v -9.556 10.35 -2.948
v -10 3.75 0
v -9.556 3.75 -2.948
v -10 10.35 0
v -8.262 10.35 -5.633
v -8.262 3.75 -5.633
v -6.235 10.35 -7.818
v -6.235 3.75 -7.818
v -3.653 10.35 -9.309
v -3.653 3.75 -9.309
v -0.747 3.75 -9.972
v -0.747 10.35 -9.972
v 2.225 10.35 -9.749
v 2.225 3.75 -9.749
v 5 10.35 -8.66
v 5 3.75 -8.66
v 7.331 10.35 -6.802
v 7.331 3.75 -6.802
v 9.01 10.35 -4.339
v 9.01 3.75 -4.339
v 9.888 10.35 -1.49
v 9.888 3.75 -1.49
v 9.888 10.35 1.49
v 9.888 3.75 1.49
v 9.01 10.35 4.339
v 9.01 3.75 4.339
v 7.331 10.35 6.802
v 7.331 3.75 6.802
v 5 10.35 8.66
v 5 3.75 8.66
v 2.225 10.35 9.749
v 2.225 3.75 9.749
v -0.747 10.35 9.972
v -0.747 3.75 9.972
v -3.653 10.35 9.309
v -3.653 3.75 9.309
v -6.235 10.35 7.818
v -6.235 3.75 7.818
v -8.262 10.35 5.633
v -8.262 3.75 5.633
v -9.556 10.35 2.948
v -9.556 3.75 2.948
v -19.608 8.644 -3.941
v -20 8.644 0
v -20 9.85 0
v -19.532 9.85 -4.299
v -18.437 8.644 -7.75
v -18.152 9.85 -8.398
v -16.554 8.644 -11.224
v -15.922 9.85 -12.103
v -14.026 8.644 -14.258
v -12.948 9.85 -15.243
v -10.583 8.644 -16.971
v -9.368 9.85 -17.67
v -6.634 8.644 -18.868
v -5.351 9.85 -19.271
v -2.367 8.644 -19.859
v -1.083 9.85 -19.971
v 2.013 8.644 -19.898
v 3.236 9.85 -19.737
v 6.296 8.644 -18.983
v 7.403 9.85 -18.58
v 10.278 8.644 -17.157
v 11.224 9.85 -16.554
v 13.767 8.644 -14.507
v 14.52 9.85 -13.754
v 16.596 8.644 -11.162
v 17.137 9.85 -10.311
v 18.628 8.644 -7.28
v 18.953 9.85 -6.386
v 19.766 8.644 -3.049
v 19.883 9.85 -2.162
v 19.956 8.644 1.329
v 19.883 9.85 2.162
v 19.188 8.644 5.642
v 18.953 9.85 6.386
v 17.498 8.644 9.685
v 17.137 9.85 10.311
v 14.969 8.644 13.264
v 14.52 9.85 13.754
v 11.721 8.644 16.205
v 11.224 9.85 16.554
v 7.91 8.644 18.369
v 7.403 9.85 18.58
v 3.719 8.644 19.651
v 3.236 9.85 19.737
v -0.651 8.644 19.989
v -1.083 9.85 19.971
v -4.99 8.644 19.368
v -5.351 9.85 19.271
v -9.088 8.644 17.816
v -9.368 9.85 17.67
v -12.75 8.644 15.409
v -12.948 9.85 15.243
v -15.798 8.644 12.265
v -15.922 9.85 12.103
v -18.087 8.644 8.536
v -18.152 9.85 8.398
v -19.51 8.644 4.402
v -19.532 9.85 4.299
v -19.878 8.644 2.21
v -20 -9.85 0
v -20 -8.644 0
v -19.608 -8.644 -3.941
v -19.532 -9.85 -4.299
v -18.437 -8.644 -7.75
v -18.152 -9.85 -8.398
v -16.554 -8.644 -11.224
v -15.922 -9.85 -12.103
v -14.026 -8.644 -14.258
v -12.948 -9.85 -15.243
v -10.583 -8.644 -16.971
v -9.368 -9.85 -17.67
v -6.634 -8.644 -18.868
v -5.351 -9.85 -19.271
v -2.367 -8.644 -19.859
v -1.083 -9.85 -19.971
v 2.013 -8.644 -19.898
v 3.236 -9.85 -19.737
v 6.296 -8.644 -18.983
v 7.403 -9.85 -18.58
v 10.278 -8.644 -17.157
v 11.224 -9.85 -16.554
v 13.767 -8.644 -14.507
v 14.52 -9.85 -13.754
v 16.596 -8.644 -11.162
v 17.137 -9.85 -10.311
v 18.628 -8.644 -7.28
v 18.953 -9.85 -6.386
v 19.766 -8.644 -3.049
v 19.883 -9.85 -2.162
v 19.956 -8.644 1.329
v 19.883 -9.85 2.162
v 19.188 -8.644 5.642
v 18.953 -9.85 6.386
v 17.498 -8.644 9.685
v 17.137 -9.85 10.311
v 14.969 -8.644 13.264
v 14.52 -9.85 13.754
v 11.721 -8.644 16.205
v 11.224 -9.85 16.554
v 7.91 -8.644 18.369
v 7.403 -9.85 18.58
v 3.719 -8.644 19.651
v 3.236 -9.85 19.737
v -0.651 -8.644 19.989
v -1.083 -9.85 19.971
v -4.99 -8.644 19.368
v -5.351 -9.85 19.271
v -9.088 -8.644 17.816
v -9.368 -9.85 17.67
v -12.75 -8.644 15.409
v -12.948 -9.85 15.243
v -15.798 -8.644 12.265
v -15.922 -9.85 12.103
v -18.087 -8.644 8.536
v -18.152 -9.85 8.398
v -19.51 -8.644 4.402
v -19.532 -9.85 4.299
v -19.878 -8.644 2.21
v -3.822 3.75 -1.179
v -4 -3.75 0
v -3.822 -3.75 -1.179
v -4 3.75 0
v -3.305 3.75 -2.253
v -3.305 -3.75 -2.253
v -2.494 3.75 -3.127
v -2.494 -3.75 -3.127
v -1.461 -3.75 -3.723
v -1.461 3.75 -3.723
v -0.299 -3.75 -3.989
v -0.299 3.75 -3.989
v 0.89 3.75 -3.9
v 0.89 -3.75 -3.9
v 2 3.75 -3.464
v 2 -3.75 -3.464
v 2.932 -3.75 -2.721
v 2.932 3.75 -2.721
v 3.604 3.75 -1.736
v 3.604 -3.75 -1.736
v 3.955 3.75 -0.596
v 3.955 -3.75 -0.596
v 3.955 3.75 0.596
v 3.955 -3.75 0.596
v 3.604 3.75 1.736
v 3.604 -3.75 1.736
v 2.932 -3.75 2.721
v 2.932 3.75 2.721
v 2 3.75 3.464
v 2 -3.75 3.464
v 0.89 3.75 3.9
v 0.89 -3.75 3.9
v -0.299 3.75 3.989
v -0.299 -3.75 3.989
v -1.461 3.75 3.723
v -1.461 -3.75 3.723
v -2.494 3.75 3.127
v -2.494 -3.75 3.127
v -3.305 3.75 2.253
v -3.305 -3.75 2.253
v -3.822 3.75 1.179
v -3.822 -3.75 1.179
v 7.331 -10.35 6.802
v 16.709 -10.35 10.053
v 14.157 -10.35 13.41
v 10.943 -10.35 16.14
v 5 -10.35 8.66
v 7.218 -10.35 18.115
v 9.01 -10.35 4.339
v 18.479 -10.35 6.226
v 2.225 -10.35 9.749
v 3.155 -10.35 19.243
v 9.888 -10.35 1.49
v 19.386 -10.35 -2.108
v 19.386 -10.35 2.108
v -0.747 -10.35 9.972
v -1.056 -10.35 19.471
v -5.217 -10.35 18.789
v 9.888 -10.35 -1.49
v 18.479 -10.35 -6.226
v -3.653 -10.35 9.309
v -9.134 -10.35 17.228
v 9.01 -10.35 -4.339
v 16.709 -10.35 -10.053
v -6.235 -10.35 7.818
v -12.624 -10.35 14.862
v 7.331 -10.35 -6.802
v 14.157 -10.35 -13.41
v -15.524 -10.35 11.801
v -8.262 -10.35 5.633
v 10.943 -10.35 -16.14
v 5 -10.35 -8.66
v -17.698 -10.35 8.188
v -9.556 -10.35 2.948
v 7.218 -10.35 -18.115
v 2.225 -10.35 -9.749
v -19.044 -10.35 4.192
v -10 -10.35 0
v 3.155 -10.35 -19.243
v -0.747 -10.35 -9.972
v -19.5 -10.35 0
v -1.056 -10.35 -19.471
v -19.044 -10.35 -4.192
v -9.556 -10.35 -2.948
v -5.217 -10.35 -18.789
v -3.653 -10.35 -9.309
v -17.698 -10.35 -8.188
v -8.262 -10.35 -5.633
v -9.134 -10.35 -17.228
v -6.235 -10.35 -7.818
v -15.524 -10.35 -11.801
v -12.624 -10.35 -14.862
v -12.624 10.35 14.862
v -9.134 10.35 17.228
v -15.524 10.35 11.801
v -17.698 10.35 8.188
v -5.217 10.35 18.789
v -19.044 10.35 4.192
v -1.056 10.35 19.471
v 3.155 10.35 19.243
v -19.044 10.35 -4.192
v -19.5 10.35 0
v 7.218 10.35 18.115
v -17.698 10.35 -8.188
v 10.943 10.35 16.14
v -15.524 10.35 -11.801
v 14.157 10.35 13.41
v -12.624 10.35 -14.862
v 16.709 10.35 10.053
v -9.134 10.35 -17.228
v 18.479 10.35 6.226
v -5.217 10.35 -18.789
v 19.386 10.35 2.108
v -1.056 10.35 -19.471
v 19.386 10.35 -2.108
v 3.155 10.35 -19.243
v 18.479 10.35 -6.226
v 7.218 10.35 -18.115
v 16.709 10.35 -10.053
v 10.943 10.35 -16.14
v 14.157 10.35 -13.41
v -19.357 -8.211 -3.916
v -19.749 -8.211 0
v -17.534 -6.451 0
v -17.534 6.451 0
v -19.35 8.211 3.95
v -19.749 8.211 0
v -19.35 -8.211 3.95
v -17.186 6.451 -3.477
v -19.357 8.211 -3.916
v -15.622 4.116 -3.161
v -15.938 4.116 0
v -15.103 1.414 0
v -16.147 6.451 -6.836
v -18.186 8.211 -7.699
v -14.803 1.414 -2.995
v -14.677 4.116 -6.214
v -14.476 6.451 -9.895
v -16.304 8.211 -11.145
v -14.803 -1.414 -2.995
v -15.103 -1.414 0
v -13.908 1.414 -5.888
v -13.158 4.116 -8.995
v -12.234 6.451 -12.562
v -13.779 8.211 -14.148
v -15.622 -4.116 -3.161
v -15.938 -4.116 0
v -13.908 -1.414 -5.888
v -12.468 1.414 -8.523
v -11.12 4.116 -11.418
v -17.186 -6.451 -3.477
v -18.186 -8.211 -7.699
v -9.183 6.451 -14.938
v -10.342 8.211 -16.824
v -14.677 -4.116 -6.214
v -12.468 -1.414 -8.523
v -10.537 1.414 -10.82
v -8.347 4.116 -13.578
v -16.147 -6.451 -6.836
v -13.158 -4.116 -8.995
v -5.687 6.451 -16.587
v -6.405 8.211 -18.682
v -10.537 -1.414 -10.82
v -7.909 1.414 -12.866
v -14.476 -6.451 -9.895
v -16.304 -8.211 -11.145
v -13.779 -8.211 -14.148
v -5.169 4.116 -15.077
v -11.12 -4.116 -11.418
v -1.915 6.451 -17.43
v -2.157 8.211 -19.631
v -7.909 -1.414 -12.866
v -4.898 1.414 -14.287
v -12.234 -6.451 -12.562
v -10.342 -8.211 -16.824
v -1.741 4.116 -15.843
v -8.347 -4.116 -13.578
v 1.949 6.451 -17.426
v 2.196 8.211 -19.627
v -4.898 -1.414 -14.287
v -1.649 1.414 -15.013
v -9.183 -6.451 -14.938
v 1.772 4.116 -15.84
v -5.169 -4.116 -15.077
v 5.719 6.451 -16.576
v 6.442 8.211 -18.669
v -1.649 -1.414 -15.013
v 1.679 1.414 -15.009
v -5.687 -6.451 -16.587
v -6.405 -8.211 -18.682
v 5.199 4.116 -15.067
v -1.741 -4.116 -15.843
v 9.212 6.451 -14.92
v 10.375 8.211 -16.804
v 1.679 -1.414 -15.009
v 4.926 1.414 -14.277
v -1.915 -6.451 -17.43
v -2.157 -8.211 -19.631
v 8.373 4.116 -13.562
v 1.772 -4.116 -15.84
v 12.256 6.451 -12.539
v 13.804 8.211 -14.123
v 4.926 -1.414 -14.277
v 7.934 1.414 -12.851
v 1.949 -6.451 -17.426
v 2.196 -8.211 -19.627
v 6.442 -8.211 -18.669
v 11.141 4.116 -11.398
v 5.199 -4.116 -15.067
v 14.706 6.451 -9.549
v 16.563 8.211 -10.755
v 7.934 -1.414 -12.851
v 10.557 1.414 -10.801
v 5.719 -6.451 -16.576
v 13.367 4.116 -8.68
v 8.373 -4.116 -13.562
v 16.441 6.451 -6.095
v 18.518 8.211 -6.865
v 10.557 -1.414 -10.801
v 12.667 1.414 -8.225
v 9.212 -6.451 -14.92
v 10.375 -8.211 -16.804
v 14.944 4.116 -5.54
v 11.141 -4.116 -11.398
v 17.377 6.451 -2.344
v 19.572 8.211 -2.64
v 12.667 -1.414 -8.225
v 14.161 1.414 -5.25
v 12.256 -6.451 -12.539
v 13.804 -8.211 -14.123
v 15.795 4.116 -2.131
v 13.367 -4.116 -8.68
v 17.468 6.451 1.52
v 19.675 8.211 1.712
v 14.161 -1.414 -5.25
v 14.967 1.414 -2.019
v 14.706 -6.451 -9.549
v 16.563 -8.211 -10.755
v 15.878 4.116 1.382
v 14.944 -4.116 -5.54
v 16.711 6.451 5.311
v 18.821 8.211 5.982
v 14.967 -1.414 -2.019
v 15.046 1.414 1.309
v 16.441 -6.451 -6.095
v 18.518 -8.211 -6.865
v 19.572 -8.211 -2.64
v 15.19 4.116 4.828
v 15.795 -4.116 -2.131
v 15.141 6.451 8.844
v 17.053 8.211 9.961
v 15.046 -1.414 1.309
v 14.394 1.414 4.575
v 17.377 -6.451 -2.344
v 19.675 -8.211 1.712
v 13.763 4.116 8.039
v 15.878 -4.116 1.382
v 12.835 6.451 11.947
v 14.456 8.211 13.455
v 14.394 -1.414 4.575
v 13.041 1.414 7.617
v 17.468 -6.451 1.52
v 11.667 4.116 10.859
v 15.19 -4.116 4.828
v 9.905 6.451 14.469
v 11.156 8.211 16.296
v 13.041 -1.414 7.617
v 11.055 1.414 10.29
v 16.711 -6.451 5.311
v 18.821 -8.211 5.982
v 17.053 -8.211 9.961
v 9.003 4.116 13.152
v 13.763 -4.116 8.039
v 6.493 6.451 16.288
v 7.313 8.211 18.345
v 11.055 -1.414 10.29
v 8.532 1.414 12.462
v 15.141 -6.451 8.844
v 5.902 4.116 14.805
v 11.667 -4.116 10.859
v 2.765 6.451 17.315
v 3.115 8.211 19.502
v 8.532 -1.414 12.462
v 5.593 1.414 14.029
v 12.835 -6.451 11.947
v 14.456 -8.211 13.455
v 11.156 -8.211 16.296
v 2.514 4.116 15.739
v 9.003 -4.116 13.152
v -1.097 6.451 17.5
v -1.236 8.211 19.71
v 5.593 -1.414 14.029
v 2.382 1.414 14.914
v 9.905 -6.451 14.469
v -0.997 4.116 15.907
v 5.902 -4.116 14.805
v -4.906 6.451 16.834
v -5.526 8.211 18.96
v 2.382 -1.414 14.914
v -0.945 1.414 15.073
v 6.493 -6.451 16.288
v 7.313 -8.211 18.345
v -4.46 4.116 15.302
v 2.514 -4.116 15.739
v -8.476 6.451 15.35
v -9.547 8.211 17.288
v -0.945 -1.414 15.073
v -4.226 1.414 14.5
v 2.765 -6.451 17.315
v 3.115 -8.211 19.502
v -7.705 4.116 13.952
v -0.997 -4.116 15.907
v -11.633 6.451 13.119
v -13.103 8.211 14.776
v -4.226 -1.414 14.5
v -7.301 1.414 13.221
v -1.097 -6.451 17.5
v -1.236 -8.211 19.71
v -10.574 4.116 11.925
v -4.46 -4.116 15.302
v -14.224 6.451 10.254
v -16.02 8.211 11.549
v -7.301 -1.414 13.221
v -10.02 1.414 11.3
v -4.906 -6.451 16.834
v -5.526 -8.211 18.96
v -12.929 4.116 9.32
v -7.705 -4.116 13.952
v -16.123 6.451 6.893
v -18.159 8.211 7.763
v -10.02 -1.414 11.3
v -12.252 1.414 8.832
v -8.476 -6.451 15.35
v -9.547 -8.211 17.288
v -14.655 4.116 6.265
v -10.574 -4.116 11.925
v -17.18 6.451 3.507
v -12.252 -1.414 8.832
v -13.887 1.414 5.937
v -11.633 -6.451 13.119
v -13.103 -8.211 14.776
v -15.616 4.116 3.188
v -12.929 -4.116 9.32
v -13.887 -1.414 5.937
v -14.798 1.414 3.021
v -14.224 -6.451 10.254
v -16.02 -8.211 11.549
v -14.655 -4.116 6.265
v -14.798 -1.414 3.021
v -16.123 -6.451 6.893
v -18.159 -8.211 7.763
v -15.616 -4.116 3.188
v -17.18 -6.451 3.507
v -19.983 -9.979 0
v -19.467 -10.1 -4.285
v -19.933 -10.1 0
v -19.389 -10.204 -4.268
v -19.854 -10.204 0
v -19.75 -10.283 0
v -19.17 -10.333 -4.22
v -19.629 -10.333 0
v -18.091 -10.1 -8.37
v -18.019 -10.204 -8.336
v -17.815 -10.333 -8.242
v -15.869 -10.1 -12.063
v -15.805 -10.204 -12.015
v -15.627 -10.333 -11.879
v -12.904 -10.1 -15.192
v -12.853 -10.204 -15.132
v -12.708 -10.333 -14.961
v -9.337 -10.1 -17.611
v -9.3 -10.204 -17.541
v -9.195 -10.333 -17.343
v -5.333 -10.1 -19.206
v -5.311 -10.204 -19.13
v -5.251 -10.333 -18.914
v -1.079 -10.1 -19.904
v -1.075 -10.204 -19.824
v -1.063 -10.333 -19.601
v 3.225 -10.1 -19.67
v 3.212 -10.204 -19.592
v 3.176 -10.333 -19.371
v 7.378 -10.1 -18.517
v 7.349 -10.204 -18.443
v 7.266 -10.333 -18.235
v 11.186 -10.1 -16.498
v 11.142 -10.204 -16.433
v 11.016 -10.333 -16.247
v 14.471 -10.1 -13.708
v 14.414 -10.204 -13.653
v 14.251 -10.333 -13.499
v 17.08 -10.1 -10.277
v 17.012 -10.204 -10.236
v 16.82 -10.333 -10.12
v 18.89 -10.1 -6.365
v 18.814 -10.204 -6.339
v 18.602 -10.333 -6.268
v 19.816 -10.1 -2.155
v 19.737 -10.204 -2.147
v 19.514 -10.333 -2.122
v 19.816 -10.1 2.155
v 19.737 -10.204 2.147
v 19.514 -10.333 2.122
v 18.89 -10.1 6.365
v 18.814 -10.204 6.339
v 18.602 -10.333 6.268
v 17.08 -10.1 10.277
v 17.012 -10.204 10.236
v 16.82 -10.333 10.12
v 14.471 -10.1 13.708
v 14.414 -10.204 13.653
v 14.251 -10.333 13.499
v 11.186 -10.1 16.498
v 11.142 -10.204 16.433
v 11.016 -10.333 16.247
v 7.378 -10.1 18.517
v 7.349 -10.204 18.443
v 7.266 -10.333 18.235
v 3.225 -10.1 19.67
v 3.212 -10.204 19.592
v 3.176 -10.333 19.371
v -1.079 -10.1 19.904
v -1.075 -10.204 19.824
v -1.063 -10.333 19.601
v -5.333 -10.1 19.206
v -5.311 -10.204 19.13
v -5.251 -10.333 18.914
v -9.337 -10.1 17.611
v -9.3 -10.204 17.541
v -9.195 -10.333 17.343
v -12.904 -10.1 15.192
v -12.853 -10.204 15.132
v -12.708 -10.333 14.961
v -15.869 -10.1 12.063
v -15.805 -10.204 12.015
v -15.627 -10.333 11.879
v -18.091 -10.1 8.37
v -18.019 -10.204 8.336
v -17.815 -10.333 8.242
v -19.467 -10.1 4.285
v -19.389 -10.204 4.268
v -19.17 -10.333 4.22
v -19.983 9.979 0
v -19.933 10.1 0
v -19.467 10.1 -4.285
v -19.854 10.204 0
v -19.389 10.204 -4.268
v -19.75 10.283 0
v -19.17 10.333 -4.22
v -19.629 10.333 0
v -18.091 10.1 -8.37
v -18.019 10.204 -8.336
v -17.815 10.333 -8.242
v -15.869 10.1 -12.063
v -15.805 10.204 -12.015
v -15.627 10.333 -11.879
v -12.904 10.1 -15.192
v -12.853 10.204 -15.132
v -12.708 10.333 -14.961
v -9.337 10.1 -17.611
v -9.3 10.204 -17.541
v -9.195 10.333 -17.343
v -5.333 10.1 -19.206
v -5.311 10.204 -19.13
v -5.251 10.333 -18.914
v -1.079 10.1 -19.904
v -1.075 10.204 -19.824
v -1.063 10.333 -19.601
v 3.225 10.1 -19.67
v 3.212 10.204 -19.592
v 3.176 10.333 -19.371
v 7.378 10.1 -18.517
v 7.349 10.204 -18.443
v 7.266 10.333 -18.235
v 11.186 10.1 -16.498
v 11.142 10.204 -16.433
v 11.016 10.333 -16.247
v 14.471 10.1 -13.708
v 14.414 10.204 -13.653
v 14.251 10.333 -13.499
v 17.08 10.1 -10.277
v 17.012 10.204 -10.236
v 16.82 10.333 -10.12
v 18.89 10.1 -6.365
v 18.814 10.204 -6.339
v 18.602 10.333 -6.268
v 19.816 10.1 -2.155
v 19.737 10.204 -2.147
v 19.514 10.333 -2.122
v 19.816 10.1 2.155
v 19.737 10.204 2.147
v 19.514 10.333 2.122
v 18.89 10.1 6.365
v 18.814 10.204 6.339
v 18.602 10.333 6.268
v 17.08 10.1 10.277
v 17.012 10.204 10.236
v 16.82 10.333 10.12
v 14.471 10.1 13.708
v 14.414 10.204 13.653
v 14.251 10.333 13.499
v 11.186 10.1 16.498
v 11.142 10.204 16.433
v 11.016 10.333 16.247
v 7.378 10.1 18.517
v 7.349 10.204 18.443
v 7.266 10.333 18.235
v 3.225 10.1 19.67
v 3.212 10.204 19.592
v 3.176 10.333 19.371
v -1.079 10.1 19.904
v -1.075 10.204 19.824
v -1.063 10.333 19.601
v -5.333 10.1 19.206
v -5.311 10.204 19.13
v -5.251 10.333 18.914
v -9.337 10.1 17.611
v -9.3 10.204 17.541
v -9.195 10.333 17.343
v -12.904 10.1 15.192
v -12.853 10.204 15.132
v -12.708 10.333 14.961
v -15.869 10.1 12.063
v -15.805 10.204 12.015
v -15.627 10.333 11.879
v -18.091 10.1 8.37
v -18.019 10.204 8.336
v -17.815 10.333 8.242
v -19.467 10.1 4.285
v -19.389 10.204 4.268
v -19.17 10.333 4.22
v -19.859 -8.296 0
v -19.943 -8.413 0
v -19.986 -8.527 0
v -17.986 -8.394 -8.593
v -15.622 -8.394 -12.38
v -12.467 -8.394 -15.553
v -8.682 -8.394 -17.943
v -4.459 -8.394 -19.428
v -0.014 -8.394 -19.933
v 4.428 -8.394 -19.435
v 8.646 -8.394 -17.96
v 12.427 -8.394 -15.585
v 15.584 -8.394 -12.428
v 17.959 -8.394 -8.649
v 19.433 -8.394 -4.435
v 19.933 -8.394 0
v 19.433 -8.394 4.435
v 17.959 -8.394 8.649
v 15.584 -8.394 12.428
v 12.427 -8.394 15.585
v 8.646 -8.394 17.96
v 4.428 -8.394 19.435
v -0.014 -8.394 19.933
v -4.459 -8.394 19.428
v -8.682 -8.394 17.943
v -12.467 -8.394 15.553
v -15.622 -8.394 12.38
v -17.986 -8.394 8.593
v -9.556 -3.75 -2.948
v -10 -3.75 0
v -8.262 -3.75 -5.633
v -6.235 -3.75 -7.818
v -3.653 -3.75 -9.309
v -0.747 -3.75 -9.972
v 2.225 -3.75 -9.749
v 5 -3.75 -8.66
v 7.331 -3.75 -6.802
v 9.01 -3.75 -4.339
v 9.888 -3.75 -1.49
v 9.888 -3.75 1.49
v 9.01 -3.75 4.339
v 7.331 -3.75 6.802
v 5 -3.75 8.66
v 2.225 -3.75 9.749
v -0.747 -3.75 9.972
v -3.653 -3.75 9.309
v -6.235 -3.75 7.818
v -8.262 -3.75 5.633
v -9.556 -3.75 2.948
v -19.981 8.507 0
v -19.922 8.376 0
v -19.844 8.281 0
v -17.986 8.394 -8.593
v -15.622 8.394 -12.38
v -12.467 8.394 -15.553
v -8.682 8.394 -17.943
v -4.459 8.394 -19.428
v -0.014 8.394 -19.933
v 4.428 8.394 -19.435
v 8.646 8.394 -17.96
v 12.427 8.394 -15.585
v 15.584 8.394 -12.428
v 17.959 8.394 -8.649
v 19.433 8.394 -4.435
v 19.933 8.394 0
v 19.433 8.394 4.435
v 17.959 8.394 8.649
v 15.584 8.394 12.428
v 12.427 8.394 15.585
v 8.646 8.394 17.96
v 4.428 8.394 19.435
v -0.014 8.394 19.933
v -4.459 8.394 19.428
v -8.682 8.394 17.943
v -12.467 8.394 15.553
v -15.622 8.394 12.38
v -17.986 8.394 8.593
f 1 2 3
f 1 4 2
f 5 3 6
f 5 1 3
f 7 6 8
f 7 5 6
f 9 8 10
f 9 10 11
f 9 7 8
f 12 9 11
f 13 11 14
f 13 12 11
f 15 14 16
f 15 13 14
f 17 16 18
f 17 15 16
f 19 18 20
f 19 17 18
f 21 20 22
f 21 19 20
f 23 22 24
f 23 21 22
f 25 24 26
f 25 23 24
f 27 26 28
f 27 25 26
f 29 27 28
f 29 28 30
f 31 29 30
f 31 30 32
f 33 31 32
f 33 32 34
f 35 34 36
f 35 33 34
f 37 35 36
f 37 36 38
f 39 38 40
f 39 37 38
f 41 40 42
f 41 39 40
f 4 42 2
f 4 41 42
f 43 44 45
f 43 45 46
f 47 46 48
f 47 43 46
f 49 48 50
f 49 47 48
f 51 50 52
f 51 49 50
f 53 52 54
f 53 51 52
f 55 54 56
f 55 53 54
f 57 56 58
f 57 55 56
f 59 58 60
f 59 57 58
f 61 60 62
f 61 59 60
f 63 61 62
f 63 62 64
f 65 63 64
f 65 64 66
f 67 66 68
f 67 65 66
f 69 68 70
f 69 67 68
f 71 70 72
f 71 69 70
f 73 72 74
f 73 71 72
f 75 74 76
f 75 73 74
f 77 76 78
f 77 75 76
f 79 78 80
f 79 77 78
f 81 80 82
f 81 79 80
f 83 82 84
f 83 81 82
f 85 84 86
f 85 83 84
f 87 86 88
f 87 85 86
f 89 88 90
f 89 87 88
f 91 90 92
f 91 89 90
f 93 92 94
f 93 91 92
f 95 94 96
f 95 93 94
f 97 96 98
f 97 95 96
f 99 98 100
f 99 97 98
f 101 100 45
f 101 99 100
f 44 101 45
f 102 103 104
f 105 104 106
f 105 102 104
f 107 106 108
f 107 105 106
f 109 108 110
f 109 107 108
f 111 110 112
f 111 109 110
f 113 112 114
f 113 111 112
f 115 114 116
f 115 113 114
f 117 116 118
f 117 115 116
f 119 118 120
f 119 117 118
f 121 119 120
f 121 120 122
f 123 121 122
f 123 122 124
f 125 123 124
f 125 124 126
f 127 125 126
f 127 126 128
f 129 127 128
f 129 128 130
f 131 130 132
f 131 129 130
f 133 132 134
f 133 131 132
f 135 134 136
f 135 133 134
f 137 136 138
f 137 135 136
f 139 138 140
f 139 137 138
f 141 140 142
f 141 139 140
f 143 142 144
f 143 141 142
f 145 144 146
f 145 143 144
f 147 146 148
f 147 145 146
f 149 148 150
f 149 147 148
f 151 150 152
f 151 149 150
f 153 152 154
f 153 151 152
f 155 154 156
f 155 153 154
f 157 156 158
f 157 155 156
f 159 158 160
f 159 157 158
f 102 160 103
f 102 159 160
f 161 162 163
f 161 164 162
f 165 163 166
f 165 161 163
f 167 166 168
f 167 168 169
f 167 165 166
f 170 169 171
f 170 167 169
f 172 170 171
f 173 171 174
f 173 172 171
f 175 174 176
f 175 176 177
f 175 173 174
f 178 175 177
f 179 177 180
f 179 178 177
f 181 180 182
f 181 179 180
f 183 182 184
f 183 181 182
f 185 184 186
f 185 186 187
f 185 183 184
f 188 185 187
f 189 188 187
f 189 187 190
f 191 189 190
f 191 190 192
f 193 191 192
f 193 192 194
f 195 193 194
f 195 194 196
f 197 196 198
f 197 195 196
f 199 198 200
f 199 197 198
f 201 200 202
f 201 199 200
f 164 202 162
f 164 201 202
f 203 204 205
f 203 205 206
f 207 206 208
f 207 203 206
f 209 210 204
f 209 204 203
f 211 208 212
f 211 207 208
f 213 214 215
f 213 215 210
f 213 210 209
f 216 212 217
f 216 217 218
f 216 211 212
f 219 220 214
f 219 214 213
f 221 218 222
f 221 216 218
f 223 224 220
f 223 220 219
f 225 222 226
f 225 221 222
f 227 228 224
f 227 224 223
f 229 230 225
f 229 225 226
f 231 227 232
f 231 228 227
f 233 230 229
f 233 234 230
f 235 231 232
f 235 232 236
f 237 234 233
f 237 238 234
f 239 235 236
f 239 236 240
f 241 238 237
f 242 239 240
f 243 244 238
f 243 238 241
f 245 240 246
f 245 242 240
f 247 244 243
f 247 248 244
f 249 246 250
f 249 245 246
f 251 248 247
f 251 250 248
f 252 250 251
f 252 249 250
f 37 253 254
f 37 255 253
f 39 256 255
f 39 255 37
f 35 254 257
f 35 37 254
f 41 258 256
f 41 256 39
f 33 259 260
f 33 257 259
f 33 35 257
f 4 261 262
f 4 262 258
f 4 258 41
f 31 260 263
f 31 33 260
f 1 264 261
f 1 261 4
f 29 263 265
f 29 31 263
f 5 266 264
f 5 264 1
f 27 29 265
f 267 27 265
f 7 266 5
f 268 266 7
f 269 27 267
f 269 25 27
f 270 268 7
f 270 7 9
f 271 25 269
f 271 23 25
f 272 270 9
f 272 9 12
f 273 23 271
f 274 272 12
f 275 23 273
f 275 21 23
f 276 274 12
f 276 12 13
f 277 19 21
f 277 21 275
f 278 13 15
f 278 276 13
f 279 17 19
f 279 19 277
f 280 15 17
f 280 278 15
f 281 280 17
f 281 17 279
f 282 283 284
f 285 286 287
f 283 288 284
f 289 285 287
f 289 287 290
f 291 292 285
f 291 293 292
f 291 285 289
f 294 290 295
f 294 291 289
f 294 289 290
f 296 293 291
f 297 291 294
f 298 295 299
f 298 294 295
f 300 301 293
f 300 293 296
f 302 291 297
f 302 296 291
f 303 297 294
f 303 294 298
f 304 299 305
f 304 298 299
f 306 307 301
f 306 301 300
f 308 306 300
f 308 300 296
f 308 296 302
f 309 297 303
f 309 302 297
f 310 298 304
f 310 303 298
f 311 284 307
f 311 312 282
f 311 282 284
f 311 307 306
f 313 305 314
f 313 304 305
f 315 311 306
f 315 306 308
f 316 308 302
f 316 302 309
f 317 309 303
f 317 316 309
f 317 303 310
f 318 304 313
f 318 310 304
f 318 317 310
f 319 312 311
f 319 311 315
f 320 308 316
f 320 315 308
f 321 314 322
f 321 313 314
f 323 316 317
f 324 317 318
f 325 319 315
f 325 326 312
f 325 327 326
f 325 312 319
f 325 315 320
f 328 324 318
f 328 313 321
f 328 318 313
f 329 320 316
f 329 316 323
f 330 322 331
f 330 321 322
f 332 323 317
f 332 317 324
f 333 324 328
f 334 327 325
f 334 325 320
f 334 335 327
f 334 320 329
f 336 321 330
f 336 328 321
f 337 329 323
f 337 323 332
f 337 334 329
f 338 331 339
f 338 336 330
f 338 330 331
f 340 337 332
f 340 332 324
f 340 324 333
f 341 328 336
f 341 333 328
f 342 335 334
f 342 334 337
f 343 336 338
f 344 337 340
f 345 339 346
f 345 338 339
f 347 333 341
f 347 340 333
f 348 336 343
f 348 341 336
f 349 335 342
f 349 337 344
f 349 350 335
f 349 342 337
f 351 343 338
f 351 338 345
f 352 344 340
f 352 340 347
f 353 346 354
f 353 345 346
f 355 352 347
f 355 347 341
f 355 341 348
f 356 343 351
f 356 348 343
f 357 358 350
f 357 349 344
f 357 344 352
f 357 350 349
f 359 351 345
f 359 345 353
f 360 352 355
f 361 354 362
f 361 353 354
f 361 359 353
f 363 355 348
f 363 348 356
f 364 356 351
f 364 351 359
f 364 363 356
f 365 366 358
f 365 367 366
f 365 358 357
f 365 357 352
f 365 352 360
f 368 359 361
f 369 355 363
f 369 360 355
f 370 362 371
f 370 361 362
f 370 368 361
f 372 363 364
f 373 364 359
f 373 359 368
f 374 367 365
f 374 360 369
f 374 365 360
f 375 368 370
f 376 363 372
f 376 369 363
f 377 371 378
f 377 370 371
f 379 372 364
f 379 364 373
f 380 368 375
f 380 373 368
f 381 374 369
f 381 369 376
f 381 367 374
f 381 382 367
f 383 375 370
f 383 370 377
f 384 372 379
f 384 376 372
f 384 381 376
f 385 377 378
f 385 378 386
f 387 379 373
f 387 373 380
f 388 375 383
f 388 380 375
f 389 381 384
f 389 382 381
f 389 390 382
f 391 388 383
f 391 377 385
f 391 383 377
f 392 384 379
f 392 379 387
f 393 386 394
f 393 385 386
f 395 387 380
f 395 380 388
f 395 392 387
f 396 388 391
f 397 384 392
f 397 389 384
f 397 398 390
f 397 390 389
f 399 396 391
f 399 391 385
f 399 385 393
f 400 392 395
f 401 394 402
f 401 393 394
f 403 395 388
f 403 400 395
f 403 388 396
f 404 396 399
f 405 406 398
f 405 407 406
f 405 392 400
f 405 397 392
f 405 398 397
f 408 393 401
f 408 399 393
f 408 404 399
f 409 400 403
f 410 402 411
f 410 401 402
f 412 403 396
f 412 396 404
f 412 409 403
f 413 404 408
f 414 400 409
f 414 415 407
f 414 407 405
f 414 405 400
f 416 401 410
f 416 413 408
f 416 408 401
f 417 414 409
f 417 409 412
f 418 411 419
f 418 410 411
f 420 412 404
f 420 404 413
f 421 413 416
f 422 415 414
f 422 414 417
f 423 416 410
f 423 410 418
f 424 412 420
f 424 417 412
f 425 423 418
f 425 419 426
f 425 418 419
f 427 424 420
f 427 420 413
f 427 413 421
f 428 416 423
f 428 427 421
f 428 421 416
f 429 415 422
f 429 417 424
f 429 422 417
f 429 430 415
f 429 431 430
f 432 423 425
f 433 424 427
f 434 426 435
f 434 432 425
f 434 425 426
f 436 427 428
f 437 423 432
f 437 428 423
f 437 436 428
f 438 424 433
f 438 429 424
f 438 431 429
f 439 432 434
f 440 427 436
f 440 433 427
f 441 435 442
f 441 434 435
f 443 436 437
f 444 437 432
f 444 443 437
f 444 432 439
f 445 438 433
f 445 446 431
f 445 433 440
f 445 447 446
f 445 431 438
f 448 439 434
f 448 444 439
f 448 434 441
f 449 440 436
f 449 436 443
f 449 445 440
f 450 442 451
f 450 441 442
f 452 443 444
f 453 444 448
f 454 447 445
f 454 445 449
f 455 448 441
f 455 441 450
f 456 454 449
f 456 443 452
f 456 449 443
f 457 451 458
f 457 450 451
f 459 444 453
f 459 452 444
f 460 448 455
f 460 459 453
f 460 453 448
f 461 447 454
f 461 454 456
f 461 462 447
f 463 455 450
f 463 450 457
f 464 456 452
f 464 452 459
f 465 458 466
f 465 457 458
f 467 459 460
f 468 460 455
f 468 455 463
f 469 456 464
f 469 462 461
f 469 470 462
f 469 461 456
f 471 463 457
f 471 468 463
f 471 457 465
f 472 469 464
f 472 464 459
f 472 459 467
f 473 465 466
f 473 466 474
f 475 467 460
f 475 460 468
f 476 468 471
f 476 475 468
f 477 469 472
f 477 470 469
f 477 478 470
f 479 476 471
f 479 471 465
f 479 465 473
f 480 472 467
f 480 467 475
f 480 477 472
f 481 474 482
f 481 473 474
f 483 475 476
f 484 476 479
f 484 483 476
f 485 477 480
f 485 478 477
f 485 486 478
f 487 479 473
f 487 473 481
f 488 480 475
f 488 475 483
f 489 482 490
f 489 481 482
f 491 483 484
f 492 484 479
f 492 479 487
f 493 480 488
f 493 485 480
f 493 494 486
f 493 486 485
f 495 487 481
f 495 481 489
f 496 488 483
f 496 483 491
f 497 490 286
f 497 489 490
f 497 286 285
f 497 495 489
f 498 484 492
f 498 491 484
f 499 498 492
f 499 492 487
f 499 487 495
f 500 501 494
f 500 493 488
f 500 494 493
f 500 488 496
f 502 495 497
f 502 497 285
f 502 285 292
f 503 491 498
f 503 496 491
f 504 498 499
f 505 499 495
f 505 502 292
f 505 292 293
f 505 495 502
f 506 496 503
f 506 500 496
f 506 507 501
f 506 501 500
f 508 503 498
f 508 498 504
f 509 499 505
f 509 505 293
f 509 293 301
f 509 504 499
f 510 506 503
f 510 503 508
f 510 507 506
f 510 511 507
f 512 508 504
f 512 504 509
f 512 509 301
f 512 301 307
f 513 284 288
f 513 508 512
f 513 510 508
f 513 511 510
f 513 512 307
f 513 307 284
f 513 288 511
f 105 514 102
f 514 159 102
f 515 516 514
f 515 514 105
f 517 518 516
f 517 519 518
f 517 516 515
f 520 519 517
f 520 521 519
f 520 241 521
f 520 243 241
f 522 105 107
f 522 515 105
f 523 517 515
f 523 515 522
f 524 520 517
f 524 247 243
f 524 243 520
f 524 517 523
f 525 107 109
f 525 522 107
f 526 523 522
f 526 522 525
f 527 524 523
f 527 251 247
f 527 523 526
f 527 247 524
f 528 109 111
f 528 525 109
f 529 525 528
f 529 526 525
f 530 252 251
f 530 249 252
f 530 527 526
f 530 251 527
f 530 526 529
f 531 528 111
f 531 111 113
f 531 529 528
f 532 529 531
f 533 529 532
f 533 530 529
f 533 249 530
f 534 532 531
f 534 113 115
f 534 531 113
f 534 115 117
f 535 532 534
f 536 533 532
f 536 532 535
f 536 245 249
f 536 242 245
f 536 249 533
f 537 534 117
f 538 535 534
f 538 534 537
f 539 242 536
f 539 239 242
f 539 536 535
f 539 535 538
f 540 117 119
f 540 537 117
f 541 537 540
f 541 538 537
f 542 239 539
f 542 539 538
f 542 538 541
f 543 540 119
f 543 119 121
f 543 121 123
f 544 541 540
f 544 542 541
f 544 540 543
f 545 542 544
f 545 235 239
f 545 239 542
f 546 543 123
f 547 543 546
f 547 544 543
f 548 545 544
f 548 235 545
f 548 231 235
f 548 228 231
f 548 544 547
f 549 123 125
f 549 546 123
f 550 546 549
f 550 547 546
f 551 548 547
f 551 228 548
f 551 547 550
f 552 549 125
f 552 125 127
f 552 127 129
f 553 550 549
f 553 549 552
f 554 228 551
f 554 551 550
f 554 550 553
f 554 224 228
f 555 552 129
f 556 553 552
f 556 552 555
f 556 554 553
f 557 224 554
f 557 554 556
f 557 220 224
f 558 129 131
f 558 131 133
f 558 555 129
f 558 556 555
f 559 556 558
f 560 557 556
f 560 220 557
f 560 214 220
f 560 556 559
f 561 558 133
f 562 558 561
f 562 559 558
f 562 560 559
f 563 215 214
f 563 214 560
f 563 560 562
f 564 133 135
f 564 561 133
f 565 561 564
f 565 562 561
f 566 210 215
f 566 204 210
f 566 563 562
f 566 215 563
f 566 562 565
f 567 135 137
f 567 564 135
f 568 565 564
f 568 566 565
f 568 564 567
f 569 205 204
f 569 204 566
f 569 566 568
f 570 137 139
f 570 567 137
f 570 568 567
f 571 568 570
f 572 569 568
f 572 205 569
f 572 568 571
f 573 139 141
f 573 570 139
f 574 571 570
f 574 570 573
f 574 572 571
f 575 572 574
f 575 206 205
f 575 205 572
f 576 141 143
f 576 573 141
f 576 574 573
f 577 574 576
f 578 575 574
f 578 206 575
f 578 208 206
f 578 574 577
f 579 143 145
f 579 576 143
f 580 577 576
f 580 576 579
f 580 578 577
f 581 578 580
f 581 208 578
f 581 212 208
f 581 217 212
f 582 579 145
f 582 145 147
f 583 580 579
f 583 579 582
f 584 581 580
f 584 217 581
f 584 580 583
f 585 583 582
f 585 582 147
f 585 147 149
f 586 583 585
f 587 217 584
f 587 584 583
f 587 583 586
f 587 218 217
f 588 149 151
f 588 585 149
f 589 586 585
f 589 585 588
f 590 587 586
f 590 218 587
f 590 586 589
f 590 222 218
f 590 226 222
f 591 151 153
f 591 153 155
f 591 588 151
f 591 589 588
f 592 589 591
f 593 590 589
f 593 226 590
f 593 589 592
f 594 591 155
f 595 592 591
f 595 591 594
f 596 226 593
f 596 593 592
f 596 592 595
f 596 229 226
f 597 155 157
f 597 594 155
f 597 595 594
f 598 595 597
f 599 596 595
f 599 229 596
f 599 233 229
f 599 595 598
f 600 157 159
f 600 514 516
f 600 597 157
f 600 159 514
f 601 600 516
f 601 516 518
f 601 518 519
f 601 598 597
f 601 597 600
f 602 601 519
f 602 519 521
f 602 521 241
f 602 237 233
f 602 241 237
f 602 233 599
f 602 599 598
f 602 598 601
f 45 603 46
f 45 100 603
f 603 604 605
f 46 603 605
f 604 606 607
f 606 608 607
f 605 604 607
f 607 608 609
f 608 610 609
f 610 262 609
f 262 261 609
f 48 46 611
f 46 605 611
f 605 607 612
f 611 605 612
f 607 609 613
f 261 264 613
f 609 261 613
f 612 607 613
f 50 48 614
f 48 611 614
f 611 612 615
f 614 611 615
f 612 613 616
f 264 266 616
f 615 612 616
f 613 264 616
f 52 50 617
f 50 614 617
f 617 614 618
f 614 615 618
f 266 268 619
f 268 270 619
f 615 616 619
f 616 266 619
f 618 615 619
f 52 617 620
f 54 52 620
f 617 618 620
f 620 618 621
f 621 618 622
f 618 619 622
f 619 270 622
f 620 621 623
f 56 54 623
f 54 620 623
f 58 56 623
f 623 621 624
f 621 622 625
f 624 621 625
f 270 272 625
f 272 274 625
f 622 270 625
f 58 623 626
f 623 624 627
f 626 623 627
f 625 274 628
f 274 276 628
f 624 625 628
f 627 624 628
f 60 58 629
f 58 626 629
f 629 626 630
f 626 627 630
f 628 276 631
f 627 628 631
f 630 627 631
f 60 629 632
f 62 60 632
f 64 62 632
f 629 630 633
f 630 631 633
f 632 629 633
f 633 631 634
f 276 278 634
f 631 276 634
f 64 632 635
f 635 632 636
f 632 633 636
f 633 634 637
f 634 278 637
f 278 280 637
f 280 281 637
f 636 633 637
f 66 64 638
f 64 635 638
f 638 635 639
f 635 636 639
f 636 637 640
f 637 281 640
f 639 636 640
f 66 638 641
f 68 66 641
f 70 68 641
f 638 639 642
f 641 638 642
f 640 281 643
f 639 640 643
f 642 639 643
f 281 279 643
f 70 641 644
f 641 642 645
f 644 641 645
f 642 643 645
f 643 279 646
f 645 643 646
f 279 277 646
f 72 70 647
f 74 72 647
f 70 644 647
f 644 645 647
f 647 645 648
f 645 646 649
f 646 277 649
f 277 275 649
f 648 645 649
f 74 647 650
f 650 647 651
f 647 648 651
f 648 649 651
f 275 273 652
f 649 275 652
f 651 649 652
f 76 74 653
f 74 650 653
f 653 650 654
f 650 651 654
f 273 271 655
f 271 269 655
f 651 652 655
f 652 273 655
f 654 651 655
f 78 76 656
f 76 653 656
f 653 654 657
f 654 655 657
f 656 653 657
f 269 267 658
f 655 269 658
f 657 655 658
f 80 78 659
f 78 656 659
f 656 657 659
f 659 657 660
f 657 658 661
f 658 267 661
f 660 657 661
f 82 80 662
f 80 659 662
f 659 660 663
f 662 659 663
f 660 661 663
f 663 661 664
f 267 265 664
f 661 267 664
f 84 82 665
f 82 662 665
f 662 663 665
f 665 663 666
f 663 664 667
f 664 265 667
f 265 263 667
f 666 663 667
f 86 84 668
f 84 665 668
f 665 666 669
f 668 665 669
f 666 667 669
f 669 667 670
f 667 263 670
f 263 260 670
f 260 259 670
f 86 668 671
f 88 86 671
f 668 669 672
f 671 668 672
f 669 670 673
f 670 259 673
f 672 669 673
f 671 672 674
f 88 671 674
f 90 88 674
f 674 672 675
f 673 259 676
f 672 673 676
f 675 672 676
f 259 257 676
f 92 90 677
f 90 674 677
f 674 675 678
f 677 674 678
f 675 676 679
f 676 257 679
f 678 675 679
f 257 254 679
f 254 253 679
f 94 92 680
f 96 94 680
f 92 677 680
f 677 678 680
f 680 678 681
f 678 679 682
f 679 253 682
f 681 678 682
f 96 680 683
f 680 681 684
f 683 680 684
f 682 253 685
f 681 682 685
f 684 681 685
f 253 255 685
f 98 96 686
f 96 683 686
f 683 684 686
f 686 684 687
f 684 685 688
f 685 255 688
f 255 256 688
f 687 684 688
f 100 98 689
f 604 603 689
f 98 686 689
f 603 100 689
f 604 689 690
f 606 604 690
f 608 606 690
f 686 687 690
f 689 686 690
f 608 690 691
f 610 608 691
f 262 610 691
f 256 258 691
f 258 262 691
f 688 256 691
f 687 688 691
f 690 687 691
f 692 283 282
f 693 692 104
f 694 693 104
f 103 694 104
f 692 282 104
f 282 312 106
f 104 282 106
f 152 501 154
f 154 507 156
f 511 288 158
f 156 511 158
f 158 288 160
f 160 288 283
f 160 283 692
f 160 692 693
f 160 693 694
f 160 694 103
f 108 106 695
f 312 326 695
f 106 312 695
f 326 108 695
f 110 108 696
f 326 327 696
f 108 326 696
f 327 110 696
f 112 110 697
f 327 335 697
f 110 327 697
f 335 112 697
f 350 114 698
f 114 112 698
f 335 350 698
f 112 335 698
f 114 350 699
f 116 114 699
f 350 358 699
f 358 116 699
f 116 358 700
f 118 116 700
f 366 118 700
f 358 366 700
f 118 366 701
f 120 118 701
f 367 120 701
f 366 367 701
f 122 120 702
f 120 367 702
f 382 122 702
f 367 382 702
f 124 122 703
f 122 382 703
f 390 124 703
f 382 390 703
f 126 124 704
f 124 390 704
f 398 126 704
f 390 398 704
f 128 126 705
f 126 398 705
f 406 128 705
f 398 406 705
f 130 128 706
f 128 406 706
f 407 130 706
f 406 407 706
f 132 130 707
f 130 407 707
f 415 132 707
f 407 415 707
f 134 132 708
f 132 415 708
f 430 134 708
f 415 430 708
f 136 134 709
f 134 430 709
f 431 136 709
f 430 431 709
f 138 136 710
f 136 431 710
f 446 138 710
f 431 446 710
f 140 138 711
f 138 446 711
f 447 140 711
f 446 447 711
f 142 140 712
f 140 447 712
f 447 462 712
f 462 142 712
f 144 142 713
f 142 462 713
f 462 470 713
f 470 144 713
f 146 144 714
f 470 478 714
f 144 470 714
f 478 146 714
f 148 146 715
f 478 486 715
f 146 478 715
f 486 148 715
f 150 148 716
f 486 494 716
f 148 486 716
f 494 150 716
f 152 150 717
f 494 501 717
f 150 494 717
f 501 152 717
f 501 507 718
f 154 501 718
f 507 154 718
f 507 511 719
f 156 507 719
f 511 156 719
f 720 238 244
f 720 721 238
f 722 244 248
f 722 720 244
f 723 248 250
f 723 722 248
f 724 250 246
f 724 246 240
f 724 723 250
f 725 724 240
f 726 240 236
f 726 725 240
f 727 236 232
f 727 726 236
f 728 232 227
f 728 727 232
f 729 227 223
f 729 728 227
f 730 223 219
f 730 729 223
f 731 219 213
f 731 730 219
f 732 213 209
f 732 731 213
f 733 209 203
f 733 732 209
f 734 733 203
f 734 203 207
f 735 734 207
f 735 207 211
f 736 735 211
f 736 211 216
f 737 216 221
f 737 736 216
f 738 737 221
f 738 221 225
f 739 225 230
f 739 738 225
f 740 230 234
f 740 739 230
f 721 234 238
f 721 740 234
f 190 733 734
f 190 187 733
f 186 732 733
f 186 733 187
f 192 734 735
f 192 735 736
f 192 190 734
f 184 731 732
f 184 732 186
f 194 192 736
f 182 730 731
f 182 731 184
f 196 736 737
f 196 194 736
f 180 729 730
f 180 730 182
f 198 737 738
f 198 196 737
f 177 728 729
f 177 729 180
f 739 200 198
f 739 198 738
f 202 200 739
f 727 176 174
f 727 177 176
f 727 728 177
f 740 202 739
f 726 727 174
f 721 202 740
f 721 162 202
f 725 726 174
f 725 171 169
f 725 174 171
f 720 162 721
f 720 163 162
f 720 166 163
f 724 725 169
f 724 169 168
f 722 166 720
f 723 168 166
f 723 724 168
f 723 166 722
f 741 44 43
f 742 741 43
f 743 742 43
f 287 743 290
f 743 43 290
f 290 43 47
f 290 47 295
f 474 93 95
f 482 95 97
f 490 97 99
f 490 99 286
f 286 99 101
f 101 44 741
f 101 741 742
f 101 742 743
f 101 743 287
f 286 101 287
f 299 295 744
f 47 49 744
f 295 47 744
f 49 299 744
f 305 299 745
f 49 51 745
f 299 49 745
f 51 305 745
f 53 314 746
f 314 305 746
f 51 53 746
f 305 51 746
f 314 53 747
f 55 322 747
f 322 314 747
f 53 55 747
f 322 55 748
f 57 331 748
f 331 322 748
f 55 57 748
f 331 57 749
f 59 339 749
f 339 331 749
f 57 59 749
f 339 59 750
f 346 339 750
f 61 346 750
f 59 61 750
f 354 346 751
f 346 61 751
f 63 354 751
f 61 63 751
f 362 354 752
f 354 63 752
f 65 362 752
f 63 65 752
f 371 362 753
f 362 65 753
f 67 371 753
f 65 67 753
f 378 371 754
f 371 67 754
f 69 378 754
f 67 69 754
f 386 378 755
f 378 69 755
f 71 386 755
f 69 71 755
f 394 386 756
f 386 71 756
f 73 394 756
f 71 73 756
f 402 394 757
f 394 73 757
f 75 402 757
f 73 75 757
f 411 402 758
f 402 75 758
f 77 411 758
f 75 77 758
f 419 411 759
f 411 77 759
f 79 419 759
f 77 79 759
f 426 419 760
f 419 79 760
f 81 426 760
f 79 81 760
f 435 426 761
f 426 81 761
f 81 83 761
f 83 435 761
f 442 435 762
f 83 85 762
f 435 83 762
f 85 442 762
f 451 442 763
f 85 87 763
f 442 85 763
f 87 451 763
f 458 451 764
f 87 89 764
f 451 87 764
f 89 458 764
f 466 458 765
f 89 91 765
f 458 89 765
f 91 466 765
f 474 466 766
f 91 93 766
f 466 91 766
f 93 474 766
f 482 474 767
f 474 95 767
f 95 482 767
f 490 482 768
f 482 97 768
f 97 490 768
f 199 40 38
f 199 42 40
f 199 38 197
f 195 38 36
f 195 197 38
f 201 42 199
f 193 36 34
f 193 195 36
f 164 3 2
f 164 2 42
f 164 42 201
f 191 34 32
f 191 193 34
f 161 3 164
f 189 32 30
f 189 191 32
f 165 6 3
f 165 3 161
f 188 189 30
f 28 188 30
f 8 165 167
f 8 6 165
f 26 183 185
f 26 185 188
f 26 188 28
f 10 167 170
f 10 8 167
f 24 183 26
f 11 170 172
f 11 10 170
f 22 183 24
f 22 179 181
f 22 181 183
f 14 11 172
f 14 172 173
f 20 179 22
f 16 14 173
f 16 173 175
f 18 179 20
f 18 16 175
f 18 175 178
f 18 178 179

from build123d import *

# Parameters (mm, degrees)
RACCORDO1_R = 0.5


with BuildPart() as part:
    # Schizzo5 → Rivoluzione12 (revolve)
    with BuildSketch(Plane.XY, mode=Mode.PRIVATE) as rivoluzione12_sk:
        with BuildLine():
            Line((20, 10.35), (20, 8.35))
            ThreePointArc((20, 8.35), (14.99677569, 0), (20, -8.35))
            Line((20, -8.35), (20, -10.35))
            Line((20, -10.35), (10, -10.35))
            Line((10, -10.35), (10, -3.75))
            Line((10, -3.75), (4, -3.75))
            Line((4, -3.75), (4, 3.75))
            Line((4, 3.75), (10, 3.75))
            Line((10, 3.75), (10, 10.35))
            Line((10, 10.35), (20, 10.35))
        make_face()
    revolve(rivoluzione12_sk.sketch.rotate(Axis((0, 10.35, 0), (0, -1, 0)), 180), axis=Axis((0, 10.35, 0), (0, -1, 0)))

    # Raccordo1
    raccordo1_edges = [part.edges().sort_by_distance(p)[0] for p in [
        (20, 10.35, 0),
        (20, 8.35, 0),
        (20, -8.35, 0),
        (20, -10.35, 0),
    ]]
    fillet(raccordo1_edges, radius=RACCORDO1_R)


solid = part.part
